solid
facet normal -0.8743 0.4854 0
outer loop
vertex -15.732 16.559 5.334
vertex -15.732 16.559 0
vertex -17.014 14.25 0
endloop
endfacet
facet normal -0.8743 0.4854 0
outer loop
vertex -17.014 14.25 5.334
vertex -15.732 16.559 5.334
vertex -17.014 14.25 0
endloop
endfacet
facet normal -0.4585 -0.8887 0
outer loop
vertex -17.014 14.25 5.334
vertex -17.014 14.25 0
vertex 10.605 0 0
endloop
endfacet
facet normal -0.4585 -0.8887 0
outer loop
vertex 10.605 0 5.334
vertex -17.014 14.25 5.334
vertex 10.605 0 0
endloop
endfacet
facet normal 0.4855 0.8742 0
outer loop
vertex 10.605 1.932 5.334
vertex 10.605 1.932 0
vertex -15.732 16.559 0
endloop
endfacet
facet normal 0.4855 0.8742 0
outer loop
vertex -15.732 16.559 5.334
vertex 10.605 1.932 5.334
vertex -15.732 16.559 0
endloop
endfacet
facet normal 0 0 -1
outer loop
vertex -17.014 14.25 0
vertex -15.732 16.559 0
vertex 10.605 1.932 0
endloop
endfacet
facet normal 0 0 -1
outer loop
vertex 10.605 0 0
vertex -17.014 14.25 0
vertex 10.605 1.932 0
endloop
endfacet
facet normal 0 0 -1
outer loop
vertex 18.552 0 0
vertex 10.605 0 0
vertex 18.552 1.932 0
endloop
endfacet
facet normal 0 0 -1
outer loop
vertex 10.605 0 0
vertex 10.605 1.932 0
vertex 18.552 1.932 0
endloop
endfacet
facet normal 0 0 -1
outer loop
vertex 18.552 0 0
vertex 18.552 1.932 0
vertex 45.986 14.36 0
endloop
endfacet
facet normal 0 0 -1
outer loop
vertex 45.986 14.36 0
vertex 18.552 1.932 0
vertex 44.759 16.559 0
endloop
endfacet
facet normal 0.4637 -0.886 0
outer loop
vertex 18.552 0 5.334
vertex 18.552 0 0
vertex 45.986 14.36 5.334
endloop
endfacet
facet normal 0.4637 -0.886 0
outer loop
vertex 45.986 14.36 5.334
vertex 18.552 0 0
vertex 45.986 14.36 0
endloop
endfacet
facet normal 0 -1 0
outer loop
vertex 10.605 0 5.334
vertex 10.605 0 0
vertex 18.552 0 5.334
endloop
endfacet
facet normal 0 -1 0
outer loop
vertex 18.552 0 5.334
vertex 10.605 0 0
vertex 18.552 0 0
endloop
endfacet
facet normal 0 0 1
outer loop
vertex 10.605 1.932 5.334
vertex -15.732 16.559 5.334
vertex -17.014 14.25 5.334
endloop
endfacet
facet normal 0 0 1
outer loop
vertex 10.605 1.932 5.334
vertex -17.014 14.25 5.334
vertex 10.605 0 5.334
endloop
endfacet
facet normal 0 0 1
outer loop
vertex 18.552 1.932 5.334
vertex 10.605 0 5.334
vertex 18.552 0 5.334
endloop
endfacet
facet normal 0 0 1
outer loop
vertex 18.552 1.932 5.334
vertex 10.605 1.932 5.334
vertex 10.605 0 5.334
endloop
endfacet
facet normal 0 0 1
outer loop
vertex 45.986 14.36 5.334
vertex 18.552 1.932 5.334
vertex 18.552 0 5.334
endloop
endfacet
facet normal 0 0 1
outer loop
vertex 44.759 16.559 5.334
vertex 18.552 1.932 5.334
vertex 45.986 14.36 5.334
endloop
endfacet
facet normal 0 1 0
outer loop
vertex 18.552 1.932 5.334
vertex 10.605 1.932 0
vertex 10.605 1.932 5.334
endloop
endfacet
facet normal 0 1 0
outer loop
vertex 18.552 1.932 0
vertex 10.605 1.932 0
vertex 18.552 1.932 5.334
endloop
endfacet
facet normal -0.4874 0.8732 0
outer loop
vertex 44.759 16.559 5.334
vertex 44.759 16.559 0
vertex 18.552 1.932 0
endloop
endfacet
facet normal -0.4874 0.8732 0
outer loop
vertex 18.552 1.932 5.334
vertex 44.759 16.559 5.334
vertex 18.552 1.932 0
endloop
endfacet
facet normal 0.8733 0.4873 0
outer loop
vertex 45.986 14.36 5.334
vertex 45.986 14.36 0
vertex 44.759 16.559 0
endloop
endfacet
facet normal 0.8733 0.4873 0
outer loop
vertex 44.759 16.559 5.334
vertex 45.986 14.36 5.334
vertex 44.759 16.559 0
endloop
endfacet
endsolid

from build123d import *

# Parameters (mm, degrees)
F0_W     = 7.947458
F0_H     = 1.932221
F1_DEPTH = 5.334


with BuildPart() as f1:
    # F0 (on Top) → F1 (new body)
    with BuildSketch(Plane.XY):
        Polygon((18.552113, 1.932221), (18.552113, 0), (45.986039, 14.360375), (44.759143, 16.558673), align=None)
        Polygon((-17.014322, 14.249988), (10.604655, 0), (10.604655, 1.932221), (-15.732167, 16.558673), align=None)
        with Locations((14.578384, 0.96611)):
            Rectangle(F0_W, F0_H)
    extrude(amount=F1_DEPTH)


solid = f1.part
